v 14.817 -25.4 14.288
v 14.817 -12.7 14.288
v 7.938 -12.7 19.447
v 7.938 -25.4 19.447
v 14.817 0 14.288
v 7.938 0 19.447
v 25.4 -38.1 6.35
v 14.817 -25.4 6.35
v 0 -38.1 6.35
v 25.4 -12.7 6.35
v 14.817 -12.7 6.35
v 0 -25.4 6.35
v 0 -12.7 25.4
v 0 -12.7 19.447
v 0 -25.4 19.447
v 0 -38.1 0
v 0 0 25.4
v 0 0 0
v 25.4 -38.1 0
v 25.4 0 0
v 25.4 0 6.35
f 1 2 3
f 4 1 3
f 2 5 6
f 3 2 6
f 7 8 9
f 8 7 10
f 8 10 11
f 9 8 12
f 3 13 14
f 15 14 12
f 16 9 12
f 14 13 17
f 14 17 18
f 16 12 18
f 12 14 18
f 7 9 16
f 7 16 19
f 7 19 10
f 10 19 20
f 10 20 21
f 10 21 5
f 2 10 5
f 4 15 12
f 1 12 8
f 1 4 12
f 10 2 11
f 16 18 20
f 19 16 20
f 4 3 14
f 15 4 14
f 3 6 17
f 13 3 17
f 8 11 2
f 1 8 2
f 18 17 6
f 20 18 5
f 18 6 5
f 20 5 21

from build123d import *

# Parameters (mm, degrees)
F1_DEPTH = 38.1
F2_DEPTH = 25.4
F3_DEPTH = 12.7
F4_DEPTH = 12.7


with BuildPart() as f1:
    # F0 (on Front) → F1 (new body)
    with BuildSketch(Plane.XZ):
        Polygon((0, 6.35), (0, 0), (25.4, 0), (25.4, 6.35), (14.816667, 6.35), align=None)
    extrude(amount=F1_DEPTH)

    # F0 (on Front) → F2 (join)
    with BuildSketch(Plane.XZ):
        Polygon((0, 19.446875), (0, 6.35), (14.816667, 6.35), (14.816667, 14.2875), (7.9375, 19.446875), align=None)
    extrude(amount=F2_DEPTH)

    # F0 (on Front) → F3 (join)
    with BuildSketch(Plane.XZ):
        Polygon((0, 25.4), (0, 19.446875), (7.9375, 19.446875), align=None)
    extrude(amount=F3_DEPTH)

    # F0 (on Front) → F4 (join)
    with BuildSketch(Plane.XZ):
        Polygon((14.816667, 14.2875), (14.816667, 6.35), (25.4, 6.35), align=None)
    extrude(amount=F4_DEPTH)


solid = f1.part
